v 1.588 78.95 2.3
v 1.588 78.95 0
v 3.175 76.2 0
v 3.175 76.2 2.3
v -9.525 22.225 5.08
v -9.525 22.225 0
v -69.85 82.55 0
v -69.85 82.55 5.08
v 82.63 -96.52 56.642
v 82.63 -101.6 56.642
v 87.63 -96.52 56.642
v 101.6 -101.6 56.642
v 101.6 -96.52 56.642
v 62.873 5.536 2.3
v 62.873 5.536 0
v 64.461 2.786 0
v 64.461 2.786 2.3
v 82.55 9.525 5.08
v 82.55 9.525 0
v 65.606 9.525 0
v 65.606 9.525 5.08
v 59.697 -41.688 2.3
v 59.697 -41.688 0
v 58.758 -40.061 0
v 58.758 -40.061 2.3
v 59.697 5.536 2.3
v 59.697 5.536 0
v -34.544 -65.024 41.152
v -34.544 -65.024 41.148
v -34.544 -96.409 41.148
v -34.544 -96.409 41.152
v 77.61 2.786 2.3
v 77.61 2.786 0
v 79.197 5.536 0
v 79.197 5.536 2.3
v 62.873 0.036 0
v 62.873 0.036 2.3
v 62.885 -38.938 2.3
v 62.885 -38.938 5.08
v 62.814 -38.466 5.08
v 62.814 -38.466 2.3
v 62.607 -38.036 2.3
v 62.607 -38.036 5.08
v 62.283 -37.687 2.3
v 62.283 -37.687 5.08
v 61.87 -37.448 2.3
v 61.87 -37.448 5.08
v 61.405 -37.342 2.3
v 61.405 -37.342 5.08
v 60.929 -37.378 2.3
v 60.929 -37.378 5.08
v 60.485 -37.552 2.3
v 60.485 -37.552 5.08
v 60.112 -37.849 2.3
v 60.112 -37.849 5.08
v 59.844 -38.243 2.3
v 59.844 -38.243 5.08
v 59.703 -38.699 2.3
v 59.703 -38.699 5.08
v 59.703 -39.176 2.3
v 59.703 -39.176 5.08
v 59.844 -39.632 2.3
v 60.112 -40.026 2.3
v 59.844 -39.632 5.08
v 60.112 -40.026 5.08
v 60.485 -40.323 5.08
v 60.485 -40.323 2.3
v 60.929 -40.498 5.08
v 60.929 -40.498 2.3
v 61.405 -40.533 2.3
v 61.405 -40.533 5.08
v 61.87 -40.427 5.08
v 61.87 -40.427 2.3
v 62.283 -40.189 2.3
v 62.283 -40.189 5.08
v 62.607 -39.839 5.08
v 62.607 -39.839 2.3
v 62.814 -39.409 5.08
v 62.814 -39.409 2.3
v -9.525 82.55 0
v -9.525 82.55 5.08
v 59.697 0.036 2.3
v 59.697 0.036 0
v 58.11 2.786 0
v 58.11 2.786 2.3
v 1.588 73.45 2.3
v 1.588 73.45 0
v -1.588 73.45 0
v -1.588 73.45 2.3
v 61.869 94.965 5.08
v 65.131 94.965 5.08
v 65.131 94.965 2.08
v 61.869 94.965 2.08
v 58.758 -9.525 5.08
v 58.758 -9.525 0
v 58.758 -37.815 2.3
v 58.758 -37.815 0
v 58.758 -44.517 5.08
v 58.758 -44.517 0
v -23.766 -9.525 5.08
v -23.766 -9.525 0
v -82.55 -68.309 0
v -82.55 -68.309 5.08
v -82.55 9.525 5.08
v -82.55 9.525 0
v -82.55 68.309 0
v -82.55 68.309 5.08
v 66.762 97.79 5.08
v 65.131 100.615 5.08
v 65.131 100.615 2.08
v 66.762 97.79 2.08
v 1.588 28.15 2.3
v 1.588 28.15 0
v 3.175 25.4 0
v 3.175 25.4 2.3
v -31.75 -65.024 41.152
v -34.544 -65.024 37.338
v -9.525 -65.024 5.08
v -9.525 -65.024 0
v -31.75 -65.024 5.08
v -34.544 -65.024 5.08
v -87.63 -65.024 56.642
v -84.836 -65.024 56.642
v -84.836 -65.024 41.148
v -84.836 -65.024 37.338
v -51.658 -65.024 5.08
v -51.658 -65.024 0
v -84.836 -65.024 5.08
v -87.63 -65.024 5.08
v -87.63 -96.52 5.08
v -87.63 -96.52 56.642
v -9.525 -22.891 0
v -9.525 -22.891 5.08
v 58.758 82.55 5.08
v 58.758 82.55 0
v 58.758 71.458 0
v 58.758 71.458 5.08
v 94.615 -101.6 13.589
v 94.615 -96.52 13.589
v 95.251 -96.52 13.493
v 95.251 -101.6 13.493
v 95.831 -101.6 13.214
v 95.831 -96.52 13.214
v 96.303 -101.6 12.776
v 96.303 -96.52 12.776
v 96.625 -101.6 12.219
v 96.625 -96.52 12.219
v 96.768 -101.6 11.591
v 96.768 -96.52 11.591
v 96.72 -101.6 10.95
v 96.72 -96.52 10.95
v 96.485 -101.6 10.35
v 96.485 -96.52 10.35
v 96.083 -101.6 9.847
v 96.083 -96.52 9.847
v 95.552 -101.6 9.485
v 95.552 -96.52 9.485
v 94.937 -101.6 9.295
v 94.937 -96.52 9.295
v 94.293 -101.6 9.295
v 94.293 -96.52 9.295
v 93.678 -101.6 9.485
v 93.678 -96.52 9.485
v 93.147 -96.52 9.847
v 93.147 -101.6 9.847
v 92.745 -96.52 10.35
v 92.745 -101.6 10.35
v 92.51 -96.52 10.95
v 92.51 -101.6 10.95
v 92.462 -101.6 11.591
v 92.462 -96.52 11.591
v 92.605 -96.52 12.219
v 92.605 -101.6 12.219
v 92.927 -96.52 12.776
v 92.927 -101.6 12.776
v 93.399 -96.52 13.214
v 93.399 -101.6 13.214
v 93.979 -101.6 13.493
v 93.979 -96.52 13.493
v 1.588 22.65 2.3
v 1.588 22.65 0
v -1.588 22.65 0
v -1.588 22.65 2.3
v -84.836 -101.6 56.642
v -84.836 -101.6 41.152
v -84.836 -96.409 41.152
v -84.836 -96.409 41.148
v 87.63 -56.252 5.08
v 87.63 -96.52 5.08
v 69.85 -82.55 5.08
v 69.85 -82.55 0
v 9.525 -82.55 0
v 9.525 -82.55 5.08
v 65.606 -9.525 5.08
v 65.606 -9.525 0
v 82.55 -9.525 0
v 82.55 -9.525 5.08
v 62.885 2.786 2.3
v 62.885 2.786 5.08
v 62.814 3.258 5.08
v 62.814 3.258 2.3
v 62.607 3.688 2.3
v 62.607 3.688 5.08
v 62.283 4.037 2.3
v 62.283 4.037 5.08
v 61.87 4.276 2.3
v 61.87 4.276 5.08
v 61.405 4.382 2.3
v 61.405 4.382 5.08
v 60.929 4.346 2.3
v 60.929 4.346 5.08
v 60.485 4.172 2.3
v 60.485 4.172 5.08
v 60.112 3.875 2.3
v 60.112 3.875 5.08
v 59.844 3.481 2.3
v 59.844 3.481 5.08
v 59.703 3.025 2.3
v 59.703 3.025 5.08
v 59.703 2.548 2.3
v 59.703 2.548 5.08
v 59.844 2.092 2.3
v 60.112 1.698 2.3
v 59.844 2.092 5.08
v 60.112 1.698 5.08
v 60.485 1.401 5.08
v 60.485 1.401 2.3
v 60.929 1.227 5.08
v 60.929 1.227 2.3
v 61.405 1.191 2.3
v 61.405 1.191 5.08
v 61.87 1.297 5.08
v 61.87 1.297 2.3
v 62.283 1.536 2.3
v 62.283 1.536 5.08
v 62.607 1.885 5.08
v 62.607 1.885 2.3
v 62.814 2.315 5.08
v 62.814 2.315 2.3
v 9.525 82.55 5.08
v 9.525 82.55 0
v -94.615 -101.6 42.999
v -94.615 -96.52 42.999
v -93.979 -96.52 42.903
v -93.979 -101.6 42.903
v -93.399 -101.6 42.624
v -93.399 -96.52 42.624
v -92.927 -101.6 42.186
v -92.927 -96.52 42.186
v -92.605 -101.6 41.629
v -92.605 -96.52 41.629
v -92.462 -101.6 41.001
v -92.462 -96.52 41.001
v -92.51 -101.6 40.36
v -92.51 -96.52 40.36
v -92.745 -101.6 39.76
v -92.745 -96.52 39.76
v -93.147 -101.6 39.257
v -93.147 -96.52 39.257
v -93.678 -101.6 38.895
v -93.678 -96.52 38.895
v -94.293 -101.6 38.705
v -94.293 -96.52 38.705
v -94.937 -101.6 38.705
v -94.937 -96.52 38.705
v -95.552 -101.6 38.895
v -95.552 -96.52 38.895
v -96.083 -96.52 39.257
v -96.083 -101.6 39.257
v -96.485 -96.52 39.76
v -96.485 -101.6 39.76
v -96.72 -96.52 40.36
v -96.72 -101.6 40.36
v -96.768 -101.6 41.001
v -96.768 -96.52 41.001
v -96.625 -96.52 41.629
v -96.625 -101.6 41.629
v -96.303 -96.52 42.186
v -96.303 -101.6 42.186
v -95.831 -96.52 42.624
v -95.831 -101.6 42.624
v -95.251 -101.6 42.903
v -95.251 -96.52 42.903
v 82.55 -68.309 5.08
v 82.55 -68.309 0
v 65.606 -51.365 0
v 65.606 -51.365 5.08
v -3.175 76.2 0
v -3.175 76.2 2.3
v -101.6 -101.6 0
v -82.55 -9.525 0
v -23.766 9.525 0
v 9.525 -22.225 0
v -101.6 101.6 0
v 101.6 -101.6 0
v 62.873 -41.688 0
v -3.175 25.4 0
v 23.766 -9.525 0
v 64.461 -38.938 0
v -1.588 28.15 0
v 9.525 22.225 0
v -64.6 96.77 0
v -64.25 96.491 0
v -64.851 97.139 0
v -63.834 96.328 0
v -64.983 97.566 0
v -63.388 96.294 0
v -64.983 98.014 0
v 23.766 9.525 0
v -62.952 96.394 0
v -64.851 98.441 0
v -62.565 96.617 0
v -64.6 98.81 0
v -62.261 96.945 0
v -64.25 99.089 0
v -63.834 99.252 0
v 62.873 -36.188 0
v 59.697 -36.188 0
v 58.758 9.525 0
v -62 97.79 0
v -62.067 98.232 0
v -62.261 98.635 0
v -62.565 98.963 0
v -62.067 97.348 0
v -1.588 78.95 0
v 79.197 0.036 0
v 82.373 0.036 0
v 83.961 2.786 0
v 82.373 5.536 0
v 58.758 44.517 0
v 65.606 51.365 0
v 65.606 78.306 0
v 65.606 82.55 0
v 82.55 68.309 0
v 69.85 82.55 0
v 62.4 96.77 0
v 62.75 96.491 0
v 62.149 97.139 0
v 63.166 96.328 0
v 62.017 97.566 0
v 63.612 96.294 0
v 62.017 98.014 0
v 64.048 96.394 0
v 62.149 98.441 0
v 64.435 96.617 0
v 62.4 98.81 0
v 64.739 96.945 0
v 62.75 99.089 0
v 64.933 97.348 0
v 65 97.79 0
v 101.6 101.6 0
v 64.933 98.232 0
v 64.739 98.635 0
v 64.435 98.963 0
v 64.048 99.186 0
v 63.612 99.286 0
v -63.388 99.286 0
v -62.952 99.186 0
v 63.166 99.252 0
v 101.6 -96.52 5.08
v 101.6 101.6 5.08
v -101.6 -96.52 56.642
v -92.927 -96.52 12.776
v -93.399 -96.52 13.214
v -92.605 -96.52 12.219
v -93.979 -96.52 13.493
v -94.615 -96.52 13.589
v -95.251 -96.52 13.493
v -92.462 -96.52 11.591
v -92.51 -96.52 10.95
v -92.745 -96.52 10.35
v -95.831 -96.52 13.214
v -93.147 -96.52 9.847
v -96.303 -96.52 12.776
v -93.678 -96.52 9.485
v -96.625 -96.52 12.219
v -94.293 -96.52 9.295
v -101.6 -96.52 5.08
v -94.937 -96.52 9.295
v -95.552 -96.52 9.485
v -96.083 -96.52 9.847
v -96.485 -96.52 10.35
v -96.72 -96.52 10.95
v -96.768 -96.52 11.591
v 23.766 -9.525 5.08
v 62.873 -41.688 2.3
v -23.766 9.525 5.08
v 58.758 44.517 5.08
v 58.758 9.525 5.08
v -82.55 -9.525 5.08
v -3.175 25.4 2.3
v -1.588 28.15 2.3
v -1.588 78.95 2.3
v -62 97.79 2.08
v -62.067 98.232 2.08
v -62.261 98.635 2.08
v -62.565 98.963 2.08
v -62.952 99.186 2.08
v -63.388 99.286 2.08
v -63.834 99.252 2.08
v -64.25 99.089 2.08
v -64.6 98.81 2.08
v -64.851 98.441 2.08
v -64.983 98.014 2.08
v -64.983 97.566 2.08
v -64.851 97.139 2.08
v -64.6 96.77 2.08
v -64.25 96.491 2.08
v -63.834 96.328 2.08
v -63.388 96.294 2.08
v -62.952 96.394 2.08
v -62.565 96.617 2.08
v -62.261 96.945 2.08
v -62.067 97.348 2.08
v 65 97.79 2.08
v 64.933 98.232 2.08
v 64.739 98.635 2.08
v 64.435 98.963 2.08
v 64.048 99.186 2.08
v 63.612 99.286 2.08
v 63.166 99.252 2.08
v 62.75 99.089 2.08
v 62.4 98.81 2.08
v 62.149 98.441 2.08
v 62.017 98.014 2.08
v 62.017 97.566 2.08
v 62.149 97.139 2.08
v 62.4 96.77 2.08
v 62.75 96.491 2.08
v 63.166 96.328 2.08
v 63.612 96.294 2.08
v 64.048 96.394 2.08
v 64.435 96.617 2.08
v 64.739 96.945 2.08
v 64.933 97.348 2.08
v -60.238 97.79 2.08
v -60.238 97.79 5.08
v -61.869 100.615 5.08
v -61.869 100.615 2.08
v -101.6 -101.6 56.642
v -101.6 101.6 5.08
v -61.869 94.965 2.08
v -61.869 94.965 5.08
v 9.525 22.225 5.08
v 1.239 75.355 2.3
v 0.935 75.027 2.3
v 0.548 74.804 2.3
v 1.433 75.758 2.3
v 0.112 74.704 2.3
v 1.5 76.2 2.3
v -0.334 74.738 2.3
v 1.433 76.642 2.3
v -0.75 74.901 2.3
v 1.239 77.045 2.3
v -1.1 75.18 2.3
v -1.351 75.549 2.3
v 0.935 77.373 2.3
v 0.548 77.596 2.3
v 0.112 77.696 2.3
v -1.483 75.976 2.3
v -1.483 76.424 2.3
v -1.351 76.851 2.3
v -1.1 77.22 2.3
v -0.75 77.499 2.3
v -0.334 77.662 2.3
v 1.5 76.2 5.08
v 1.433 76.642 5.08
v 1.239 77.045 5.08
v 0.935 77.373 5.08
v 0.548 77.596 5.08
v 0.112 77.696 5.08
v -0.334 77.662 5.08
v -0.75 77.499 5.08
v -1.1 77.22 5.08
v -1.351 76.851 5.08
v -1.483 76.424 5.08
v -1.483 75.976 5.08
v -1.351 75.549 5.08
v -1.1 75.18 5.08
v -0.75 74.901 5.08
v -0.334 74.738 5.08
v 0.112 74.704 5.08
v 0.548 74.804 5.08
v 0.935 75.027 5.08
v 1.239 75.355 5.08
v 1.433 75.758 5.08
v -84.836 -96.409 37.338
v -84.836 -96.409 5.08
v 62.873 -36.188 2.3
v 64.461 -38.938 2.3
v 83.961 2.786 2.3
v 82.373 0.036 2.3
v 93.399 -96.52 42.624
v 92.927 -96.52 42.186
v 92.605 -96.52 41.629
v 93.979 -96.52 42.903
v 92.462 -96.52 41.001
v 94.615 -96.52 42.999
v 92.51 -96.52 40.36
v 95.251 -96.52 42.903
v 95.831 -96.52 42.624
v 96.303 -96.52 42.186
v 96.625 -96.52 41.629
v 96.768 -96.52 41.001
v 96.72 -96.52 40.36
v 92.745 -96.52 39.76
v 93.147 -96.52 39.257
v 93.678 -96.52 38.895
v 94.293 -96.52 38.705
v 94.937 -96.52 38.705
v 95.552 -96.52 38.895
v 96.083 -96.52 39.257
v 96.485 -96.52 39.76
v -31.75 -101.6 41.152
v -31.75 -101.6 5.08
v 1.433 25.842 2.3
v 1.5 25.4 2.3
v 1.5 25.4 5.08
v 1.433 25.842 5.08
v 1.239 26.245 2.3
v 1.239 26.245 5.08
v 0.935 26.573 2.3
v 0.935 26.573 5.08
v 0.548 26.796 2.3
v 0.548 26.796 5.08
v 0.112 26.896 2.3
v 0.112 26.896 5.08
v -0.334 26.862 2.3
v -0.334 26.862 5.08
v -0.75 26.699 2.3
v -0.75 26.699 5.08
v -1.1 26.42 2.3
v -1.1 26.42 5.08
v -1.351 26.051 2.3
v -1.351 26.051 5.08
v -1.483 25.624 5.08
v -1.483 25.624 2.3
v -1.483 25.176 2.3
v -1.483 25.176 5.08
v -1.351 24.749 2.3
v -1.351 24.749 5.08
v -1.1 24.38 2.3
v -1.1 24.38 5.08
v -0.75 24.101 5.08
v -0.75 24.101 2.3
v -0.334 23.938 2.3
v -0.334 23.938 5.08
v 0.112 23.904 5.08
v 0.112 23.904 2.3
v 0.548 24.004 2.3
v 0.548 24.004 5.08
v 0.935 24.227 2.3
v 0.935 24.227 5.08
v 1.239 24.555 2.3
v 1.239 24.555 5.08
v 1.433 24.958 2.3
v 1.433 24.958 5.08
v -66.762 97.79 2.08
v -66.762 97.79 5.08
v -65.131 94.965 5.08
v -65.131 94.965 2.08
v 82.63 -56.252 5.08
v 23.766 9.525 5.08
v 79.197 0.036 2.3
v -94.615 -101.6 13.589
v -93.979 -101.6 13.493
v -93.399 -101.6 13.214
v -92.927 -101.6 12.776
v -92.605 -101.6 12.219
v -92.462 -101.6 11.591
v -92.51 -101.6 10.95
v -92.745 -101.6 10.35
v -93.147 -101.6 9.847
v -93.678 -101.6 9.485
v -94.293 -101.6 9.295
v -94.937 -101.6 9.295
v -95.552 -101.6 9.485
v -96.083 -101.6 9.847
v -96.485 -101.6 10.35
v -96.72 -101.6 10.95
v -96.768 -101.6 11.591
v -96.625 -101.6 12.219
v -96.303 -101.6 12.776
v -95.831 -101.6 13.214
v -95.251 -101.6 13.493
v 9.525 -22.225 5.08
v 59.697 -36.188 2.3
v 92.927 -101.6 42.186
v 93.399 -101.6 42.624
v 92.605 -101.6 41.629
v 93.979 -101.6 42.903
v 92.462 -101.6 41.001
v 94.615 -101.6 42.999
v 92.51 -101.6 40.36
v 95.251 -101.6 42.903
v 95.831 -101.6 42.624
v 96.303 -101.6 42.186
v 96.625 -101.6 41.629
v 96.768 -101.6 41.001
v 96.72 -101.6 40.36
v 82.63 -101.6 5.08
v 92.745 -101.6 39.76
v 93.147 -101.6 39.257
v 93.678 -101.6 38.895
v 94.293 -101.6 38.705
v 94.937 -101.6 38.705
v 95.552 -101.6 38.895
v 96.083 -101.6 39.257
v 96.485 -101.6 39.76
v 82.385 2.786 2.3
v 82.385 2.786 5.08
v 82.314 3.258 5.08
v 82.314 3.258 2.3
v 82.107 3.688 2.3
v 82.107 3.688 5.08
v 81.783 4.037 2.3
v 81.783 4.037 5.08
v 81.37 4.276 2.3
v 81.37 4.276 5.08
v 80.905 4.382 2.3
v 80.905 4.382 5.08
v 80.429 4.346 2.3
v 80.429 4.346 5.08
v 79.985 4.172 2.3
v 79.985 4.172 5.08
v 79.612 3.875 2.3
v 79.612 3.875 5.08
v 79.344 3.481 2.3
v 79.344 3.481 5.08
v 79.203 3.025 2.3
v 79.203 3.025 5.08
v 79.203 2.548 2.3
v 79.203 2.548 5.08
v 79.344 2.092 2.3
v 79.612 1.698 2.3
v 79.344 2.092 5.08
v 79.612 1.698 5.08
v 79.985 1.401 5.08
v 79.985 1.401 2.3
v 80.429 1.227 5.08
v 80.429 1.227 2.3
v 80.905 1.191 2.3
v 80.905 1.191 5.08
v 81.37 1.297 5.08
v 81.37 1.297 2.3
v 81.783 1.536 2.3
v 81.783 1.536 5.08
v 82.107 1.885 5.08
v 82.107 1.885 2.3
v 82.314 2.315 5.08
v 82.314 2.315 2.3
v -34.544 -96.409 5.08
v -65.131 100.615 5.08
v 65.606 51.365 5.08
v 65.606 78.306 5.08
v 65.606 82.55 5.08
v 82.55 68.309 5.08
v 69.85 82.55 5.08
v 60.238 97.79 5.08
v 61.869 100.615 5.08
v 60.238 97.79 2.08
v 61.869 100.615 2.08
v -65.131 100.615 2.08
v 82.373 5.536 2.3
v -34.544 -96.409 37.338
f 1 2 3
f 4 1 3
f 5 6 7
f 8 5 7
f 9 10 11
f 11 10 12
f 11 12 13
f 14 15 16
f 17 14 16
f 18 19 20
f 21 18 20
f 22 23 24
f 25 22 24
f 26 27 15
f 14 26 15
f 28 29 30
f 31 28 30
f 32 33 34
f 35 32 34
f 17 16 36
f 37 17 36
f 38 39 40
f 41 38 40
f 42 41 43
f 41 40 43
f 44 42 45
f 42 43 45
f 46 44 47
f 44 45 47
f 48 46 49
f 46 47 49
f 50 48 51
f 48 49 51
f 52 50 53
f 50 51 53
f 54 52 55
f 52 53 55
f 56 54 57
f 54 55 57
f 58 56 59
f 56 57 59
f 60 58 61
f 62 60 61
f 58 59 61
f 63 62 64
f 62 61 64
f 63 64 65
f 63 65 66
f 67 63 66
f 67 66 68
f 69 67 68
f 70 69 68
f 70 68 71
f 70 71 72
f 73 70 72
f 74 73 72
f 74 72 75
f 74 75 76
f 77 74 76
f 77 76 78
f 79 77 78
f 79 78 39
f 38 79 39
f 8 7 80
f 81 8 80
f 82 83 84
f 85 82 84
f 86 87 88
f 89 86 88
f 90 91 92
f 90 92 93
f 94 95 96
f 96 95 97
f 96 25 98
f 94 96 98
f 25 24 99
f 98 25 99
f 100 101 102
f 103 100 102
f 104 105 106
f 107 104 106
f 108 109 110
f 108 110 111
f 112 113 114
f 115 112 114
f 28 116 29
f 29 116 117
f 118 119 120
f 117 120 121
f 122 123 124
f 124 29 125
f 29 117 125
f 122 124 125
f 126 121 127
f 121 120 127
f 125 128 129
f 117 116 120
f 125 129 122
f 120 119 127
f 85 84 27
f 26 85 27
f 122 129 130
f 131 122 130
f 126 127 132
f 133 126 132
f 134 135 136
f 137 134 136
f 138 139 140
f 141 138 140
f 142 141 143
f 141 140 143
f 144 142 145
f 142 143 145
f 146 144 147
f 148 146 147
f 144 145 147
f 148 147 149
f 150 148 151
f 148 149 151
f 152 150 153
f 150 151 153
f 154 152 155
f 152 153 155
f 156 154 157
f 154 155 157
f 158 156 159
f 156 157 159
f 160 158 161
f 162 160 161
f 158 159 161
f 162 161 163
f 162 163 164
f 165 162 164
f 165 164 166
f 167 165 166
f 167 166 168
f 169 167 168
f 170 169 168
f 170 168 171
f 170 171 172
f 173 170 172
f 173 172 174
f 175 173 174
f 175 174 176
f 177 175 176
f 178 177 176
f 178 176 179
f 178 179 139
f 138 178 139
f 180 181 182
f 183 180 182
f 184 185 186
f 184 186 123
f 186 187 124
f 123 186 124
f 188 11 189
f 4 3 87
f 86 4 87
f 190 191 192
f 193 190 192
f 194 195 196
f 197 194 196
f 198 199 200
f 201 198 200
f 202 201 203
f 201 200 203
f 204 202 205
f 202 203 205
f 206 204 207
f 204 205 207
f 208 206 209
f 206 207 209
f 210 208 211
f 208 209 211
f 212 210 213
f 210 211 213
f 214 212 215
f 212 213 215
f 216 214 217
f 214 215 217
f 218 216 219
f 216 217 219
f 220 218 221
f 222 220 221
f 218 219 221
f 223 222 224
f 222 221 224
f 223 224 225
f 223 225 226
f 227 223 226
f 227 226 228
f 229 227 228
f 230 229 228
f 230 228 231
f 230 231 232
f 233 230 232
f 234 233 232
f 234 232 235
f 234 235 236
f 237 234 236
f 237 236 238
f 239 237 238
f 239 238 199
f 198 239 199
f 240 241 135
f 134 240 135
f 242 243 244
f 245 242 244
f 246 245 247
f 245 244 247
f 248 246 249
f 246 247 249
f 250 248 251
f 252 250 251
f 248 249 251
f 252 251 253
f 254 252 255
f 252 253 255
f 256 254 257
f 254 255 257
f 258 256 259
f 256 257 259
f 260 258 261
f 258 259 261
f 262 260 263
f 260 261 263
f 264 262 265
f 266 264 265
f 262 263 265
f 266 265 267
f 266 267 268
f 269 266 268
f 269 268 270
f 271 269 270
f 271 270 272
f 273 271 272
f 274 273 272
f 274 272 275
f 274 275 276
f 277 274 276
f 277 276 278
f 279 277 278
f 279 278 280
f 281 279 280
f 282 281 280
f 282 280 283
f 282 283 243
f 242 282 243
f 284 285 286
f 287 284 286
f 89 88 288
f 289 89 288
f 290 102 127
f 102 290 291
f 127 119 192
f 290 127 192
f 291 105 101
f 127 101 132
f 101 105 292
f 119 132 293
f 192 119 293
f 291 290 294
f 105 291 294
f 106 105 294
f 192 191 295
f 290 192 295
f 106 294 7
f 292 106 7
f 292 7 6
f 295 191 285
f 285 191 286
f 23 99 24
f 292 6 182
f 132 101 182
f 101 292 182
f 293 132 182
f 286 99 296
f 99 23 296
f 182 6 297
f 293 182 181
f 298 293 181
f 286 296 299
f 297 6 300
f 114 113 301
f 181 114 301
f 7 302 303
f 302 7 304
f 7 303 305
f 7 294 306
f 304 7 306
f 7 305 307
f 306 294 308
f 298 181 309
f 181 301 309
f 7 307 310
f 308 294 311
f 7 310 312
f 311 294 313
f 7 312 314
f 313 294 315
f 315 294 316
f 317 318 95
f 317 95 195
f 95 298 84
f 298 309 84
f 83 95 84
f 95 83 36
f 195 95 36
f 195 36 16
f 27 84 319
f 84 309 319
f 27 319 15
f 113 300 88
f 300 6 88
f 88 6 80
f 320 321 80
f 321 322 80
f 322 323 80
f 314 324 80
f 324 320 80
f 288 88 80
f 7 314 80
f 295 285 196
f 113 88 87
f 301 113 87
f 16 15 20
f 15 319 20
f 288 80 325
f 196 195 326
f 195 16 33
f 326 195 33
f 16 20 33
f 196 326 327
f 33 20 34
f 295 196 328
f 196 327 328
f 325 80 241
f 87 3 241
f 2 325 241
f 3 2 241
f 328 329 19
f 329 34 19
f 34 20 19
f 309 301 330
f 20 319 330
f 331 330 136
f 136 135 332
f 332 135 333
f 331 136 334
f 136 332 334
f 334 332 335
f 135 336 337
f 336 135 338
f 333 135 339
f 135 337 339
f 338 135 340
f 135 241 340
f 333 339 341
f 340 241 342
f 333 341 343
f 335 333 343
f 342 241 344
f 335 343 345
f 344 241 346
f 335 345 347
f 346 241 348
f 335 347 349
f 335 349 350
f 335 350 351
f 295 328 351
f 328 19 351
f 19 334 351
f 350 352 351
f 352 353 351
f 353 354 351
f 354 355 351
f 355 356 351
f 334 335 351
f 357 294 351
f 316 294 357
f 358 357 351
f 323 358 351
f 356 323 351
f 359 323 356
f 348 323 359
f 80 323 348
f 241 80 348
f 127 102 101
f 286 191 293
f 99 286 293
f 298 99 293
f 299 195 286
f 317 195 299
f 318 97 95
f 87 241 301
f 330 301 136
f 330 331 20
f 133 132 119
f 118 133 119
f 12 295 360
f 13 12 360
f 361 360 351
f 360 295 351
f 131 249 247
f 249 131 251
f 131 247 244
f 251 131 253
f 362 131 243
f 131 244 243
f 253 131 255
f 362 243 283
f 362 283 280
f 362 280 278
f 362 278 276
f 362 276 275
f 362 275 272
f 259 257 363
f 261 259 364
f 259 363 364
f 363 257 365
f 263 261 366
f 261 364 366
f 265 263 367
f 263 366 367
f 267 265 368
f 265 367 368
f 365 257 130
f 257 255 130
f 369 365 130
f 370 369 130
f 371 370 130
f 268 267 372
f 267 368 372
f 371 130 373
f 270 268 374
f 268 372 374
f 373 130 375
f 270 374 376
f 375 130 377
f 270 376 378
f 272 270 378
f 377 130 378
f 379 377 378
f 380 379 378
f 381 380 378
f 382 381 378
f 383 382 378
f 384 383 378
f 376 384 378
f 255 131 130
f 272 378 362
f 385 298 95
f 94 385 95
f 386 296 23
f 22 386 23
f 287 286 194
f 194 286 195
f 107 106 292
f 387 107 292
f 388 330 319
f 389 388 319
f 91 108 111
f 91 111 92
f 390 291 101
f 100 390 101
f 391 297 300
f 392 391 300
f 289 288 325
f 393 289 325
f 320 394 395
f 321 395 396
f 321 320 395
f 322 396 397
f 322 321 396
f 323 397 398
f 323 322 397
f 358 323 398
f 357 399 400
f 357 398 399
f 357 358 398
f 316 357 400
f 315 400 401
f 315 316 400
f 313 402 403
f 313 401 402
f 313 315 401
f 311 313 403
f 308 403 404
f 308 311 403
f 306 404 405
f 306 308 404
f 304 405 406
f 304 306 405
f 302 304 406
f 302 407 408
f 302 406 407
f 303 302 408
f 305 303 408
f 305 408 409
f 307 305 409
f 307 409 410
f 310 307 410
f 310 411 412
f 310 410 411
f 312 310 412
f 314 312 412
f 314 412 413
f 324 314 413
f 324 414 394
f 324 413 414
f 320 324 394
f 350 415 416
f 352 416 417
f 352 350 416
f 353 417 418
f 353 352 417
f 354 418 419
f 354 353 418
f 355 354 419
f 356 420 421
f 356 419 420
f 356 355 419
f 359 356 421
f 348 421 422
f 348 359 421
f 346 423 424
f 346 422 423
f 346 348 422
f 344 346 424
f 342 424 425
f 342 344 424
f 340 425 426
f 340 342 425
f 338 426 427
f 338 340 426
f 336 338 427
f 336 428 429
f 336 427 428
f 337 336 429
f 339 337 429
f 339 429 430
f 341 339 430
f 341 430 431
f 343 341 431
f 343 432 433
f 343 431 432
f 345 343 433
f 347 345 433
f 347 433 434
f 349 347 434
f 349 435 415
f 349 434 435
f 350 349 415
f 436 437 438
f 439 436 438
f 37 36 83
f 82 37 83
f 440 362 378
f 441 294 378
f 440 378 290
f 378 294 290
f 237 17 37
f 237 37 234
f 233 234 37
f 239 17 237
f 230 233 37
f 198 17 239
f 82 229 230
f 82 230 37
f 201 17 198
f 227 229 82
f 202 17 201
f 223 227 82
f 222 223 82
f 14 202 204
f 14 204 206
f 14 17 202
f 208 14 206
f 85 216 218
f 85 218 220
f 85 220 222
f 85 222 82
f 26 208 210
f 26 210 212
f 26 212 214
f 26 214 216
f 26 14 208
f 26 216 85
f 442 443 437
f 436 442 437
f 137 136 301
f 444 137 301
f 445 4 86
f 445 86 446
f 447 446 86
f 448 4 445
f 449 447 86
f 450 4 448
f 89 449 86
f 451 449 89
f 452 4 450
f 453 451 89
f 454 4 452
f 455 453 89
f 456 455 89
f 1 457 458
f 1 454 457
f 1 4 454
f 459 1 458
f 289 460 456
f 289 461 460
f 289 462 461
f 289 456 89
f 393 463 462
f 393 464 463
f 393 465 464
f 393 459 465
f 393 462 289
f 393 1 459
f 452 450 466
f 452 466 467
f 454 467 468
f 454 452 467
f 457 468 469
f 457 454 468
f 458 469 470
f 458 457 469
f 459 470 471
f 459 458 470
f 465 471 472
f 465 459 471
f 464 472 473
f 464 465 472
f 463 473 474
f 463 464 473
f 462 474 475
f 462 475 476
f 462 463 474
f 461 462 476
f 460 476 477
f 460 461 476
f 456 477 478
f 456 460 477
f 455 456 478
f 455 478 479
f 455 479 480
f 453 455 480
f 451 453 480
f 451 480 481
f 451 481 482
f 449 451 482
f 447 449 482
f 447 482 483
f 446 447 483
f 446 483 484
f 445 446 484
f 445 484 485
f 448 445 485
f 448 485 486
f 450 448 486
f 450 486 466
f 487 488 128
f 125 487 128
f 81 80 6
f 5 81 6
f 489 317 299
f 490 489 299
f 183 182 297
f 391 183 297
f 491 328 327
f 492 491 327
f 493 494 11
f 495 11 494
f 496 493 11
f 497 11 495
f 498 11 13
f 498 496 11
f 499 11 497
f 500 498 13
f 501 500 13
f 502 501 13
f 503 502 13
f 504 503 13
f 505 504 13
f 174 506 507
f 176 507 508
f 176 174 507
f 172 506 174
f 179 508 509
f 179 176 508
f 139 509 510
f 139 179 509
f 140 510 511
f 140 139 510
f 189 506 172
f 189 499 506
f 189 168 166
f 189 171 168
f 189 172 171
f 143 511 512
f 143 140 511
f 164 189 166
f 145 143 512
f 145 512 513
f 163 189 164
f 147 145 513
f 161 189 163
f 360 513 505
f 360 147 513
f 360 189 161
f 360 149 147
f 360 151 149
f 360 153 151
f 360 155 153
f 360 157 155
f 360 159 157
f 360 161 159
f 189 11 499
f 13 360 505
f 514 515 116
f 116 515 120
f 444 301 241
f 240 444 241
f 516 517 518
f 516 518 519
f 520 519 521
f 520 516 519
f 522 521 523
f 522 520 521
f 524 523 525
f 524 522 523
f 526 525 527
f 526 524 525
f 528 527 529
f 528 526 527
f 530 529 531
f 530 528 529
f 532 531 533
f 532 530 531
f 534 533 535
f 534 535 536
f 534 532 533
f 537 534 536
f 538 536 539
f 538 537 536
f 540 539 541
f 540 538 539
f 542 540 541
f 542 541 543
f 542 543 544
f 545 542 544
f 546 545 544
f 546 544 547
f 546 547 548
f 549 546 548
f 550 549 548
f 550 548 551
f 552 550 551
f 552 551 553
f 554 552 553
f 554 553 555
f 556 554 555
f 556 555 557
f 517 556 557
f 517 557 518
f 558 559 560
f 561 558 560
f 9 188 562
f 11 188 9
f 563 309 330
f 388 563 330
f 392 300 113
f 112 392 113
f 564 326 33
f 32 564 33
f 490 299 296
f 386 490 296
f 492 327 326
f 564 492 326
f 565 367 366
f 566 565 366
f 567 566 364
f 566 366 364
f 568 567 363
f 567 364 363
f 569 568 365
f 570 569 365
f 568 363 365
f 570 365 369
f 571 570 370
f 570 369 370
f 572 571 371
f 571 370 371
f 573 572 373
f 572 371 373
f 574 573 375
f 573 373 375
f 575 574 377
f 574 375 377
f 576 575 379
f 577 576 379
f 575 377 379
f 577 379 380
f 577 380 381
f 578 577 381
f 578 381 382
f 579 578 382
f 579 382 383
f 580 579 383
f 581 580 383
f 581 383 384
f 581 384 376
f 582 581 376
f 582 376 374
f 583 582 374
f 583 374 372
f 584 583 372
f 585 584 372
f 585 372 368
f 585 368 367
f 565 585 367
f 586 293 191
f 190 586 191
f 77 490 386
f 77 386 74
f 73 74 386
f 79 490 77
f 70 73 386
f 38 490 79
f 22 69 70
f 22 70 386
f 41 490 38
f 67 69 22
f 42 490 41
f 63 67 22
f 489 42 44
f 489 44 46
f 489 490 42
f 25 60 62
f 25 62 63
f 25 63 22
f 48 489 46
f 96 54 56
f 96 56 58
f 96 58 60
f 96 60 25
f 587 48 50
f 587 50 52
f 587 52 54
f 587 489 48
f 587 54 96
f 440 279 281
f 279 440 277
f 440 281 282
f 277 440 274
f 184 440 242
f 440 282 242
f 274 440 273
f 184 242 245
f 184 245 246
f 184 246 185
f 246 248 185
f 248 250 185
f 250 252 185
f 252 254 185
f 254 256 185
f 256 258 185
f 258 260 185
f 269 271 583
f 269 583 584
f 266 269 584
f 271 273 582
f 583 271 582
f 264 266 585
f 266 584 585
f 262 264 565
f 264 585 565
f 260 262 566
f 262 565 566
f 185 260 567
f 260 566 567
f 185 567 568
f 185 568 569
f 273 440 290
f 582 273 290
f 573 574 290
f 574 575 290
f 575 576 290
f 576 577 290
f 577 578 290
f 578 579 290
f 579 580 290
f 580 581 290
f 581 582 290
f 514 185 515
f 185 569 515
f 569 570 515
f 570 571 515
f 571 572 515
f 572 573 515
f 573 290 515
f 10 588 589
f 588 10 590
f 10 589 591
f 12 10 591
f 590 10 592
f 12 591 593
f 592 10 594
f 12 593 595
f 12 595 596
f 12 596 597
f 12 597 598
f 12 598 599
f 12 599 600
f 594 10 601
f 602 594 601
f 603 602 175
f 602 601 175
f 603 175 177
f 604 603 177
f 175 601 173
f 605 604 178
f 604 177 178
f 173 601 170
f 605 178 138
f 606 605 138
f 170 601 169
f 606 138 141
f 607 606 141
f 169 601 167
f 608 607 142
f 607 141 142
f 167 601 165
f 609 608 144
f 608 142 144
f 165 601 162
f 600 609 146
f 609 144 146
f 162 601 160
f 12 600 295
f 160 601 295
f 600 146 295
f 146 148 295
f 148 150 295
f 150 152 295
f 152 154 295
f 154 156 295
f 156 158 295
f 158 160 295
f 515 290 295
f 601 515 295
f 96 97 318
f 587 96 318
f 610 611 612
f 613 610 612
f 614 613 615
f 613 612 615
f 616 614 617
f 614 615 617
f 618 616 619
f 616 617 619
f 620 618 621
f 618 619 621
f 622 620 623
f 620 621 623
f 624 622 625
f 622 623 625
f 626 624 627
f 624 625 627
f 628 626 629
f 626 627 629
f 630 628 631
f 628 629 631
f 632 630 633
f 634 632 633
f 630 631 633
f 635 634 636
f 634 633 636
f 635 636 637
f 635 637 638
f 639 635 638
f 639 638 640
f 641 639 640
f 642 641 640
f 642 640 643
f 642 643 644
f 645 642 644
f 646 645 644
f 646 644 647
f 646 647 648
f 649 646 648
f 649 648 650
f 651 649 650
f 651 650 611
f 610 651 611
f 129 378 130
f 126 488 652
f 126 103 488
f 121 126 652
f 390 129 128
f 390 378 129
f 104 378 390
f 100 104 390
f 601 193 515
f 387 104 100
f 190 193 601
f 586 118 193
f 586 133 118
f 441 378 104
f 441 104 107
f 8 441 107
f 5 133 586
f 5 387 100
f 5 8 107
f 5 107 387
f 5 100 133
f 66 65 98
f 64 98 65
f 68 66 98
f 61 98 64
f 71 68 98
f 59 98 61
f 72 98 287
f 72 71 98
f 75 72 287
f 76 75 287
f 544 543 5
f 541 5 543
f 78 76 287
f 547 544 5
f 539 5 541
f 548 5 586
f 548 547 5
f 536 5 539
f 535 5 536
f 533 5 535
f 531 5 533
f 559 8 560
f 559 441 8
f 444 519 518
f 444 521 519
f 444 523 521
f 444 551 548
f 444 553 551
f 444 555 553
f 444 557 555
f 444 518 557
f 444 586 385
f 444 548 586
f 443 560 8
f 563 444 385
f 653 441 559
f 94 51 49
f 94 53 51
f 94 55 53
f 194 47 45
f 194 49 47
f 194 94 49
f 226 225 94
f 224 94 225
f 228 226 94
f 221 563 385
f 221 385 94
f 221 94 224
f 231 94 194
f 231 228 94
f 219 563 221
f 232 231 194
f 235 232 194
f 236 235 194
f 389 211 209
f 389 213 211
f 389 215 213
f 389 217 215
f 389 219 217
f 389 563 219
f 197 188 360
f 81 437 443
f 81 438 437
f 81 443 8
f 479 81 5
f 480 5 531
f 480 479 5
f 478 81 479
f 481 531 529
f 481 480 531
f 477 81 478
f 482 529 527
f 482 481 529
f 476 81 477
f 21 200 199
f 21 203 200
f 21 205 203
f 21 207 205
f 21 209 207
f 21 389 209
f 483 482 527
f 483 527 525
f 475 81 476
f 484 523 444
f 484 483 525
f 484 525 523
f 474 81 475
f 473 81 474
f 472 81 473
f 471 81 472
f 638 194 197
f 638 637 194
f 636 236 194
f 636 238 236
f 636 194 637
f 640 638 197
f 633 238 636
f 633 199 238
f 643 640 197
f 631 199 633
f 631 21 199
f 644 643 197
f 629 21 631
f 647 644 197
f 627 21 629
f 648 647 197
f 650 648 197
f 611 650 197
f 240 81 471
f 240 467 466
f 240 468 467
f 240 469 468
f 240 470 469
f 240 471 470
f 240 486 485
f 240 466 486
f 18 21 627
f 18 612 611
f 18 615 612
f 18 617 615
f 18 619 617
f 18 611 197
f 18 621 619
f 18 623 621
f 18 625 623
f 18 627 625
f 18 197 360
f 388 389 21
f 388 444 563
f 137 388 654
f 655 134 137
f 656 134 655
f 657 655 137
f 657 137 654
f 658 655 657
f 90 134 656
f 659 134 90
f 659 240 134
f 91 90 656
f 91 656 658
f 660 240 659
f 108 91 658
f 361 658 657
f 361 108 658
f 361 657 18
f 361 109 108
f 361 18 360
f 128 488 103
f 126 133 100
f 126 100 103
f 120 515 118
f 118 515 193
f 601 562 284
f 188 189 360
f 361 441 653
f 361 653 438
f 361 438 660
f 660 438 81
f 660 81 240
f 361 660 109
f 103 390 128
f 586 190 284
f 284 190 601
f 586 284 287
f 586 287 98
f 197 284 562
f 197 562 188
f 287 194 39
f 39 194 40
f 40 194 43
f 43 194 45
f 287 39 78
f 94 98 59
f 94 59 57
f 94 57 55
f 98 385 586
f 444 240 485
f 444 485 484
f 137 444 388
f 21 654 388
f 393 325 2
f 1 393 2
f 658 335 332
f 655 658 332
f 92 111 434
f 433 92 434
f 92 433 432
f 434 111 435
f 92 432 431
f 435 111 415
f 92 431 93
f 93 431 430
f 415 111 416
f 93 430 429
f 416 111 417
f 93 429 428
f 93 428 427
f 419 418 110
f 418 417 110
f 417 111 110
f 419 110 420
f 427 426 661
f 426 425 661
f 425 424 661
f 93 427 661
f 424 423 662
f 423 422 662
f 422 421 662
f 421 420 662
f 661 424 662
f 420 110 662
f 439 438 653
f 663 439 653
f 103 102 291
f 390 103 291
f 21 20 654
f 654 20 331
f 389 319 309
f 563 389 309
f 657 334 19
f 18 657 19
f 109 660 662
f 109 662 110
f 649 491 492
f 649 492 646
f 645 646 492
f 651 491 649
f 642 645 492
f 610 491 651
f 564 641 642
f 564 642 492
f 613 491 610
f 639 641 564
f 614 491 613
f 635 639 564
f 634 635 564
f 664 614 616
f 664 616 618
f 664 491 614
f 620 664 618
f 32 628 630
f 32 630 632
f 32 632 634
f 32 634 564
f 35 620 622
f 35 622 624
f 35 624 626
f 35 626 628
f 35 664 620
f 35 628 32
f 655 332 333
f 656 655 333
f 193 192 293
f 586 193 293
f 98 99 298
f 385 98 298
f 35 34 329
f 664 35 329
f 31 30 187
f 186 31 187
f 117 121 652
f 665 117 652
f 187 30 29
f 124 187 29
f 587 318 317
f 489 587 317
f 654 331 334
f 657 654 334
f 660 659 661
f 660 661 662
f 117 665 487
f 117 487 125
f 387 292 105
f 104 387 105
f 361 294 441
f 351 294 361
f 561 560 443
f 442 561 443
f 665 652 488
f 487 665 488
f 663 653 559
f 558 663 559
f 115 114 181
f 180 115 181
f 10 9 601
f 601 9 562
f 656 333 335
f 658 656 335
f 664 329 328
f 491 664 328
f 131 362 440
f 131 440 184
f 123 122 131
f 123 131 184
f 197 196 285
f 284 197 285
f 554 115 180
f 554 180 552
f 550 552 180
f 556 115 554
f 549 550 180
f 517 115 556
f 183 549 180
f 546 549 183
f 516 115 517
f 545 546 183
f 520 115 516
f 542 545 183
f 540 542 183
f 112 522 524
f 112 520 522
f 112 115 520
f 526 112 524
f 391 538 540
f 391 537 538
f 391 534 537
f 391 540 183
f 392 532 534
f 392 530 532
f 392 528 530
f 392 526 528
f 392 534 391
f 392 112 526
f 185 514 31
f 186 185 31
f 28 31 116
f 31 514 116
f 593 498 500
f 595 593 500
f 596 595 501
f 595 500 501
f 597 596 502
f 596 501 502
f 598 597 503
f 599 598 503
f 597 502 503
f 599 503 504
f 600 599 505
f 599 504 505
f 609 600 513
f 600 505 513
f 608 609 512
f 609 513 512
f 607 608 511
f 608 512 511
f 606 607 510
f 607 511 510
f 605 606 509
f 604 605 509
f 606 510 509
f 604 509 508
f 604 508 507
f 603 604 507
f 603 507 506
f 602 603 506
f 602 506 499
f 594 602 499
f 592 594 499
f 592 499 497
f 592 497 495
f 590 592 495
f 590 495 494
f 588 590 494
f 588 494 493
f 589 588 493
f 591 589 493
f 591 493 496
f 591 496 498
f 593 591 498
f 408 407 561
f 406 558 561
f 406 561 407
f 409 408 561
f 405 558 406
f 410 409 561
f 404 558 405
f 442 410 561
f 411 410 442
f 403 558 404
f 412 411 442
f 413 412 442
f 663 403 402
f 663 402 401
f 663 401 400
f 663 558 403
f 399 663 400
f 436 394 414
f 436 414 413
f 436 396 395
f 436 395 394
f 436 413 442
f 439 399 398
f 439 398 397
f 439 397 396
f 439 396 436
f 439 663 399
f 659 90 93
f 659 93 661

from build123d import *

# Parameters (mm, degrees)
SKETCH1_W           = 203.2
SKETCH1_H           = 203.2
SKETCH1_R           = 1.5
BOSS_EXTRUDE1_DEPTH = 5.08
SKETCH2_W           = 13.97
SKETCH2_H           = 5.08
BOSS_EXTRUDE2_DEPTH = 51.562
CUT_EXTRUDE1_REACH  = 231.744
SKETCH3_R           = 2.159
CUT_EXTRUDE4_DEPTH  = 3
BOSS_EXTRUDE3_REACH = 181.07
SKETCH12_W          = 3.81
SKETCH12_H          = 31.496
SKETCH14_W          = 15.49
SKETCH14_H          = 36.576
CUT_EXTRUDE5_DEPTH  = 53.086
SKETCH15_R          = 1.6
CUT_EXTRUDE6_DEPTH  = 10
CUT_EXTRUDE7_DEPTH  = 2.3
BOSS_EXTRUDE5_START = -13.97
SKETCH17_W          = 51.562
SKETCH17_H          = 5.08
BOSS_EXTRUDE5_DEPTH = 5


with BuildPart() as part:
    # Sketch1 → Boss-Extrude1 (new body)
    with BuildSketch(Plane.XY):
        Rectangle(SKETCH1_W, SKETCH1_H)
        Polygon((-82.55, -68.309231637), (-82.55, -9.525), (-23.765768363, -9.525), align=None, mode=Mode.SUBTRACT)
        Polygon((-51.657605136, -65.024), (-9.525, -22.891394864), (-9.525, -65.024), align=None, mode=Mode.SUBTRACT)
        Polygon((9.525, -82.55), (9.525, -22.225), (69.85, -82.55), align=None, mode=Mode.SUBTRACT)
        Polygon((82.55, -68.309231637), (65.605706321, -51.364937958), (65.605706321, -9.525), (82.55, -9.525), align=None, mode=Mode.SUBTRACT)
        Polygon((58.758115986, -44.517347622), (23.765768363, -9.525), (58.758115986, -9.525), align=None, mode=Mode.SUBTRACT)
        Polygon((-23.765768363, 9.525), (-82.55, 9.525), (-82.55, 68.309231637), align=None, mode=Mode.SUBTRACT)
        Polygon((-9.525, 22.225), (-69.85, 82.55), (-9.525, 82.55), align=None, mode=Mode.SUBTRACT)
        with Locations((-63.5, 97.79)):
            Circle(SKETCH1_R, mode=Mode.SUBTRACT)
        with Locations((0, 25.4)):
            Circle(SKETCH1_R, mode=Mode.SUBTRACT)
        Polygon((58.758115986, 44.517347622), (58.758115986, 9.525), (23.765768363, 9.525), align=None, mode=Mode.SUBTRACT)
        Polygon((9.525, 82.55), (58.758115986, 82.55), (58.758115986, 71.458115986), (9.525, 22.225), align=None, mode=Mode.SUBTRACT)
        Polygon((82.55, 9.525), (65.605706321, 9.525), (65.605706321, 51.364937958), (82.55, 68.309231637), align=None, mode=Mode.SUBTRACT)
        with Locations((0, 76.2)):
            Circle(SKETCH1_R, mode=Mode.SUBTRACT)
        Polygon((65.605706321, 78.305706321), (65.605706321, 82.55), (69.85, 82.55), align=None, mode=Mode.SUBTRACT)
        with Locations((63.5, 97.79)):
            Circle(SKETCH1_R, mode=Mode.SUBTRACT)
    extrude(amount=BOSS_EXTRUDE1_DEPTH)

    # Sketch2 → Boss-Extrude2 (add)
    with BuildSketch(Plane.XY.offset(5.08)):
        Polygon((-101.6, -96.52), (-101.6, -101.6), (-31.75, -101.6), (-31.75, -65.024), (-34.544, -65.024), (-34.544, -96.409365186), (-84.836, -96.409365186), (-84.836, -65.024), (-87.63, -65.024), (-87.63, -96.52), align=None)
        with Locations((94.615, -99.06)):
            Rectangle(SKETCH2_W, SKETCH2_H)
    extrude(amount=BOSS_EXTRUDE2_DEPTH)

    # Sketch3 → Cut-Extrude1 (cut, up to next)
    with BuildSketch(Plane(origin=(0, -96.52, 0), x_dir=(1, 0, 0), z_dir=(0, 1, 0)), mode=Mode.PRIVATE) as cut_extrude1_sk1:
        with Locations(Location((-94.615, -11.43, 0), (0, 0, 270))):
            Circle(SKETCH3_R)
    cut_extrude1_tool1 = extrude(cut_extrude1_sk1.sketch, amount=-CUT_EXTRUDE1_REACH, mode=Mode.PRIVATE) & part.part
    # Sketch3 → Cut-Extrude1 (cut, up to next)
    with BuildSketch(Plane(origin=(0, -96.52, 0), x_dir=(1, 0, 0), z_dir=(0, 1, 0)), mode=Mode.PRIVATE) as cut_extrude1_sk2:
        with Locations(Location((94.615, -11.43, 0), (0, 0, 270))):
            Circle(SKETCH3_R)
    cut_extrude1_tool2 = extrude(cut_extrude1_sk2.sketch, amount=-CUT_EXTRUDE1_REACH, mode=Mode.PRIVATE) & part.part
    # Sketch3 → Cut-Extrude1 (cut, up to next)
    with BuildSketch(Plane(origin=(0, -96.52, 0), x_dir=(1, 0, 0), z_dir=(0, 1, 0)), mode=Mode.PRIVATE) as cut_extrude1_sk3:
        with Locations(Location((94.615, -40.84, 0), (0, 0, 270))):
            Circle(SKETCH3_R)
    cut_extrude1_tool3 = extrude(cut_extrude1_sk3.sketch, amount=-CUT_EXTRUDE1_REACH, mode=Mode.PRIVATE) & part.part
    # Sketch3 → Cut-Extrude1 (cut, up to next)
    with BuildSketch(Plane(origin=(0, -96.52, 0), x_dir=(1, 0, 0), z_dir=(0, 1, 0)), mode=Mode.PRIVATE) as cut_extrude1_sk4:
        with Locations(Location((-94.615, -40.84, 0), (0, 0, 270))):
            Circle(SKETCH3_R)
    cut_extrude1_tool4 = extrude(cut_extrude1_sk4.sketch, amount=-CUT_EXTRUDE1_REACH, mode=Mode.PRIVATE) & part.part
    add(cut_extrude1_tool1.solids().sort_by_distance((-94.615, -96.52, 11.43))[0], mode=Mode.SUBTRACT)
    add(cut_extrude1_tool2.solids().sort_by_distance((94.615, -96.52, 11.43))[0], mode=Mode.SUBTRACT)
    add(cut_extrude1_tool3.solids().sort_by_distance((94.615, -96.52, 40.84))[0], mode=Mode.SUBTRACT)
    add(cut_extrude1_tool4.solids().sort_by_distance((-94.615, -96.52, 40.84))[0], mode=Mode.SUBTRACT)

    # Sketch11 → Cut-Extrude4 (cut)
    with BuildSketch(Plane.XY.offset(5.08)):
        Polygon((-61.86898549, 94.965), (-60.237970979, 97.79), (-61.86898549, 100.615), (-65.13101451, 100.615), (-66.762029021, 97.79), (-65.13101451, 94.965), align=None)
        Polygon((65.13101451, 94.965), (61.86898549, 94.965), (60.237970979, 97.79), (61.86898549, 100.615), (65.13101451, 100.615), (66.762029021, 97.79), align=None)
    extrude(amount=-CUT_EXTRUDE4_DEPTH, mode=Mode.SUBTRACT)

    # Sketch12 → Boss-Extrude3 (add, up to next)
    with BuildSketch(Plane.ZY.offset(34.544), mode=Mode.PRIVATE) as boss_extrude3_sk1:
        with Locations((39.243, -80.772)):
            Rectangle(SKETCH12_W, SKETCH12_H)
    boss_extrude3_tool1 = extrude(boss_extrude3_sk1.sketch, amount=BOSS_EXTRUDE3_REACH, mode=Mode.PRIVATE) - part.part
    add(boss_extrude3_tool1.solids().sort_by_distance((-34.544, -80.772, 39.243))[0])

    # Sketch14 → Cut-Extrude5 (cut)
    with BuildSketch(Plane(origin=(-31.75, 0, 0), x_dir=(0, 0, -1), z_dir=(1, 0, 0))):
        with Locations((-48.897, -83.312)):
            Rectangle(SKETCH14_W, SKETCH14_H)
    extrude(amount=-CUT_EXTRUDE5_DEPTH, mode=Mode.SUBTRACT)

    # Sketch15 → Cut-Extrude6 (cut)
    with BuildSketch(Plane.XY.offset(5.08)):
        with Locations((61.285165756, 2.786448521)):
            Circle(SKETCH15_R)
        with Locations((80.785165756, 2.786448521)):
            Circle(SKETCH15_R)
        with Locations((80.785165756, -38.937697653)):
            Circle(SKETCH15_R)
        with Locations((61.285165756, -38.937697653)):
            Circle(SKETCH15_R)
    extrude(amount=-CUT_EXTRUDE6_DEPTH, mode=Mode.SUBTRACT)

    # Sketch16 → Cut-Extrude7 (cut)
    with BuildSketch(Plane(origin=(0, 0, 0), x_dir=(-1, 0, 0), z_dir=(0, 0, -1))):
        Polygon((-1.58771324, 73.45), (1.58771324, 73.45), (3.175426481, 76.2), (1.58771324, 78.95), (-1.58771324, 78.95), (-3.175426481, 76.2), align=None)
        Polygon((-3.175426481, 25.4), (-1.58771324, 22.65), (1.58771324, 22.65), (3.175426481, 25.4), (1.58771324, 28.15), (-1.58771324, 28.15), align=None)
        Polygon((-64.460592236, 2.786448521), (-62.872878996, 0.036448521), (-59.697452515, 0.036448521), (-58.109739275, 2.786448521), (-59.697452515, 5.536448521), (-62.872878996, 5.536448521), align=None)
        Polygon((-83.960592236, 2.786448521), (-82.372878996, 0.036448521), (-79.197452515, 0.036448521), (-77.609739275, 2.786448521), (-79.197452515, 5.536448521), (-82.372878996, 5.536448521), align=None)
        Polygon((-64.460592236, -38.937697653), (-62.872878996, -41.687697653), (-59.697452515, -41.687697653), (-58.109739275, -38.937697653), (-59.697452515, -36.187697653), (-62.872878996, -36.187697653), align=None)
    extrude(amount=-CUT_EXTRUDE7_DEPTH, mode=Mode.SUBTRACT)

    # Sketch17 → Boss-Extrude5 (add)
    with BuildSketch(Plane(origin=(101.6, 0, 0), x_dir=(0, 0, -1), z_dir=(1, 0, 0)).offset(BOSS_EXTRUDE5_START)):
        Polygon((-5.08, -56.252401603), (-56.642, -96.52), (-5.08, -96.52), align=None)
        with Locations((-30.861, -99.06)):
            Rectangle(SKETCH17_W, SKETCH17_H)
    extrude(amount=-BOSS_EXTRUDE5_DEPTH)


solid = part.part
